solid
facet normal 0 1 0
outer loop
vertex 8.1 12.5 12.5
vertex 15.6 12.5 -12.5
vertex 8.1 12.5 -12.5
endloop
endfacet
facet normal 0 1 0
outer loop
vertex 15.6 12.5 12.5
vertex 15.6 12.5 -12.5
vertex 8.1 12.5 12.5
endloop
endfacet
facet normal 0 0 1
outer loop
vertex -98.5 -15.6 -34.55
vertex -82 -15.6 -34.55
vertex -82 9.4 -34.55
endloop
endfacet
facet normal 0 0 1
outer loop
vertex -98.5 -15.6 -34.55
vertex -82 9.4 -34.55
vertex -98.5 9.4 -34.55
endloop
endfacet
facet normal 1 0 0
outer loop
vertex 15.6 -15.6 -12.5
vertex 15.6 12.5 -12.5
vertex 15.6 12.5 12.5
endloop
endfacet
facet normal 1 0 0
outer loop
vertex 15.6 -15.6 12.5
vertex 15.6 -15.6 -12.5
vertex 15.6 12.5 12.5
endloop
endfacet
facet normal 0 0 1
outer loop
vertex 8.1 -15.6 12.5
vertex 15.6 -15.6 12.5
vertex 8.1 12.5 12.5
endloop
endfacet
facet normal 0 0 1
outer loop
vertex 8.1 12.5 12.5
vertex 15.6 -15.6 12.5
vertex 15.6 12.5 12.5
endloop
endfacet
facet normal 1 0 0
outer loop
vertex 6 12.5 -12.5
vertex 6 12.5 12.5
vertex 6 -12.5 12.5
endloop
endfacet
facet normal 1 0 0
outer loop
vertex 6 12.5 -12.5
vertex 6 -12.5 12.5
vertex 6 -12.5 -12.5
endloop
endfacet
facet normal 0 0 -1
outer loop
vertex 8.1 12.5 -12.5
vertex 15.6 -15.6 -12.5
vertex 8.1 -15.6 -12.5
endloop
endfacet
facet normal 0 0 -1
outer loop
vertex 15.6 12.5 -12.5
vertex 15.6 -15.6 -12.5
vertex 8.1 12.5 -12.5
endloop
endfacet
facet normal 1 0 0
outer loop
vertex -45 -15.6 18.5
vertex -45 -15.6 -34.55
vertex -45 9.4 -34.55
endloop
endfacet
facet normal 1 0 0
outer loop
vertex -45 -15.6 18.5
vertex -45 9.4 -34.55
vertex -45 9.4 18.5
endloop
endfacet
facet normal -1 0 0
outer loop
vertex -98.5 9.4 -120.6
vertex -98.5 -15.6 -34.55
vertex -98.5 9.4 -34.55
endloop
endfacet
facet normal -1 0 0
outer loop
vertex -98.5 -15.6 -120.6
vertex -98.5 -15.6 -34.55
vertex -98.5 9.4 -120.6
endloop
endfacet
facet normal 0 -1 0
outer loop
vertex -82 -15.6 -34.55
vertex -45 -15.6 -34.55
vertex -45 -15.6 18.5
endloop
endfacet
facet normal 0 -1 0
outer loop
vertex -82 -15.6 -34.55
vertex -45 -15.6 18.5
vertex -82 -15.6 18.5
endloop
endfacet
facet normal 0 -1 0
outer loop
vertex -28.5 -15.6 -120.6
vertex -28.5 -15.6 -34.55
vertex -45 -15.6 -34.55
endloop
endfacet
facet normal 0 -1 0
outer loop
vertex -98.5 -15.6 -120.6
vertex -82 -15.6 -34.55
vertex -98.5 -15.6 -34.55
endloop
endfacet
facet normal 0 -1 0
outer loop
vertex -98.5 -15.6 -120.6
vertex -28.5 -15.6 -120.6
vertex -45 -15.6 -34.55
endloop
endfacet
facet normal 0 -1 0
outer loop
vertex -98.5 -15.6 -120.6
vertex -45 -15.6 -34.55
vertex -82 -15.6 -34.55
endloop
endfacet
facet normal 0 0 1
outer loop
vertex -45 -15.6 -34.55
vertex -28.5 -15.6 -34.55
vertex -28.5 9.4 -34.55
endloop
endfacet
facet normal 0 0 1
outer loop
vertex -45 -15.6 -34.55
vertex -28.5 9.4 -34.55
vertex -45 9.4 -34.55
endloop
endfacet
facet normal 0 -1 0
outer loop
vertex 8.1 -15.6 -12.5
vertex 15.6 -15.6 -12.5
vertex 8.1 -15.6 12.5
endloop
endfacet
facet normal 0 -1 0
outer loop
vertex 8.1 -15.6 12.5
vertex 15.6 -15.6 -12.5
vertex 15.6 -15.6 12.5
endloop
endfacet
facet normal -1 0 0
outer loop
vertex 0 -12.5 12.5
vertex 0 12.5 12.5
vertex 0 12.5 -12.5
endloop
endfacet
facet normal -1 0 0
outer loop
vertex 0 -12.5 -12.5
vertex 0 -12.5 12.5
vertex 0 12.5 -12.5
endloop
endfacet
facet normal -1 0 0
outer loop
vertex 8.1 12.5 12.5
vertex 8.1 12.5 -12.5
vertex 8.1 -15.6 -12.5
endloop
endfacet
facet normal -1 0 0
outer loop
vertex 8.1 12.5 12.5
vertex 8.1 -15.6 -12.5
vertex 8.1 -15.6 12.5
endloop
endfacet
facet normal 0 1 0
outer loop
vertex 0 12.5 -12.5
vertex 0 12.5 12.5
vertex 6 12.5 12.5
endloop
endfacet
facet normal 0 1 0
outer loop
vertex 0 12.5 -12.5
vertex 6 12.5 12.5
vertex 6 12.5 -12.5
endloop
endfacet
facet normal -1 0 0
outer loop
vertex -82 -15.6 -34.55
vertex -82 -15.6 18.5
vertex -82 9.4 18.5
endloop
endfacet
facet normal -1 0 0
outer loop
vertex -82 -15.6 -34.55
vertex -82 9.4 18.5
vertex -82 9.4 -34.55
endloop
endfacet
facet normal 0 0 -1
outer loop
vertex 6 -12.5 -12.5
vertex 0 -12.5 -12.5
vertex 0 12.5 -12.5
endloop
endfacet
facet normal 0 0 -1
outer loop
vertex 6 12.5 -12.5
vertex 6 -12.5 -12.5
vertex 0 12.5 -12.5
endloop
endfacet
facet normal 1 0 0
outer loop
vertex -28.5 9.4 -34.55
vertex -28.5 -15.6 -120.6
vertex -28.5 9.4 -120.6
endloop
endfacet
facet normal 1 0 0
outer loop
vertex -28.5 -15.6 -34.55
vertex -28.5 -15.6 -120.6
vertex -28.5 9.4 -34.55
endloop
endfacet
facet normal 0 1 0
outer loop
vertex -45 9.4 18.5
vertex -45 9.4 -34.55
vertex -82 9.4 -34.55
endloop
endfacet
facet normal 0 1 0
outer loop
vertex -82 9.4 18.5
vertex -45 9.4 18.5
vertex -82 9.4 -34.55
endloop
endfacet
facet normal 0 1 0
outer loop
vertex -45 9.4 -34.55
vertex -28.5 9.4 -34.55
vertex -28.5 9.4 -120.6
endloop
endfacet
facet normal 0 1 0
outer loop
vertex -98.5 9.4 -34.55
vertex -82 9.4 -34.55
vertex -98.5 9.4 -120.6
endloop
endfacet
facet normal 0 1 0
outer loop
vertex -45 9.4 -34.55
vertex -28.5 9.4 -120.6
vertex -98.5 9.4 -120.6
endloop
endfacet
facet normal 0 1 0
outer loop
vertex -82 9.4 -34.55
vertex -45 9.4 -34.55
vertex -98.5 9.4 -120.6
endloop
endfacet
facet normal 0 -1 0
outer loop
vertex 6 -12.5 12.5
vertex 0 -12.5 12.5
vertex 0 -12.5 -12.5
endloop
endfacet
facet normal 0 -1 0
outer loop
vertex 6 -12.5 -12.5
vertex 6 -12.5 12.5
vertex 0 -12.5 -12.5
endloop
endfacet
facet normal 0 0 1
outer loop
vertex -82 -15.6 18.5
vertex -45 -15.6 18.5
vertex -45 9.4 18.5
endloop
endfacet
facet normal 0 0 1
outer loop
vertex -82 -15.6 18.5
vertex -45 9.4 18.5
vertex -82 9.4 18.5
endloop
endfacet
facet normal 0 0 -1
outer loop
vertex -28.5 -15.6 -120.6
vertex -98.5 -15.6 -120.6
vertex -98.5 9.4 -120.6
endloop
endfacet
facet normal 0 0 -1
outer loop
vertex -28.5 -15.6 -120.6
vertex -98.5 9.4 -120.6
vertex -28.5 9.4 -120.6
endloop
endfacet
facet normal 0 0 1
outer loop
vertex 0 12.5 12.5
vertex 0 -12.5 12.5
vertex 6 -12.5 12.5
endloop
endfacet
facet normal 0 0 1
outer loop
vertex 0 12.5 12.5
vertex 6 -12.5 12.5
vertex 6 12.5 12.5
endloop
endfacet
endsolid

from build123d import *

# Parameters (mm, degrees)
SKETCH1_W           = 25
SKETCH1_H           = 25
BOSS_EXTRUDE1_DEPTH = 6
SKETCH3_W           = 25
SKETCH3_H           = 28.1
BOSS_EXTRUDE2_DEPTH = 7.5
BOSS_EXTRUDE3_DEPTH = 25


with BuildPart() as part:
    # Sketch1 → Boss-Extrude1 (new body)
    with BuildSketch(Plane(origin=(0, 0, 0), x_dir=(0, 0, -1), z_dir=(1, 0, 0))):
        Rectangle(SKETCH1_W, SKETCH1_H)
    extrude(amount=BOSS_EXTRUDE1_DEPTH)


with BuildPart() as body_2:
    # Sketch3 → Boss-Extrude2 (new body)
    with BuildSketch(Plane.ZY.offset(-15.6)):
        with Locations((0, -1.55)):
            Rectangle(SKETCH3_W, SKETCH3_H)
    extrude(amount=BOSS_EXTRUDE2_DEPTH)


with BuildPart() as body_3:
    # Sketch12 → Boss-Extrude3 (new body)
    with BuildSketch(Plane(origin=(0, -15.6, 0), x_dir=(1, 0, 0), z_dir=(0, 1, 0))):
        Polygon((-98.5, 120.6), (-28.5, 120.6), (-28.5, 34.55), (-45, 34.55), (-45, -18.5), (-82, -18.5), (-82, 34.55), (-98.5, 34.55), align=None)
    extrude(amount=BOSS_EXTRUDE3_DEPTH)


solid = Compound([part.part, body_2.part, body_3.part])
